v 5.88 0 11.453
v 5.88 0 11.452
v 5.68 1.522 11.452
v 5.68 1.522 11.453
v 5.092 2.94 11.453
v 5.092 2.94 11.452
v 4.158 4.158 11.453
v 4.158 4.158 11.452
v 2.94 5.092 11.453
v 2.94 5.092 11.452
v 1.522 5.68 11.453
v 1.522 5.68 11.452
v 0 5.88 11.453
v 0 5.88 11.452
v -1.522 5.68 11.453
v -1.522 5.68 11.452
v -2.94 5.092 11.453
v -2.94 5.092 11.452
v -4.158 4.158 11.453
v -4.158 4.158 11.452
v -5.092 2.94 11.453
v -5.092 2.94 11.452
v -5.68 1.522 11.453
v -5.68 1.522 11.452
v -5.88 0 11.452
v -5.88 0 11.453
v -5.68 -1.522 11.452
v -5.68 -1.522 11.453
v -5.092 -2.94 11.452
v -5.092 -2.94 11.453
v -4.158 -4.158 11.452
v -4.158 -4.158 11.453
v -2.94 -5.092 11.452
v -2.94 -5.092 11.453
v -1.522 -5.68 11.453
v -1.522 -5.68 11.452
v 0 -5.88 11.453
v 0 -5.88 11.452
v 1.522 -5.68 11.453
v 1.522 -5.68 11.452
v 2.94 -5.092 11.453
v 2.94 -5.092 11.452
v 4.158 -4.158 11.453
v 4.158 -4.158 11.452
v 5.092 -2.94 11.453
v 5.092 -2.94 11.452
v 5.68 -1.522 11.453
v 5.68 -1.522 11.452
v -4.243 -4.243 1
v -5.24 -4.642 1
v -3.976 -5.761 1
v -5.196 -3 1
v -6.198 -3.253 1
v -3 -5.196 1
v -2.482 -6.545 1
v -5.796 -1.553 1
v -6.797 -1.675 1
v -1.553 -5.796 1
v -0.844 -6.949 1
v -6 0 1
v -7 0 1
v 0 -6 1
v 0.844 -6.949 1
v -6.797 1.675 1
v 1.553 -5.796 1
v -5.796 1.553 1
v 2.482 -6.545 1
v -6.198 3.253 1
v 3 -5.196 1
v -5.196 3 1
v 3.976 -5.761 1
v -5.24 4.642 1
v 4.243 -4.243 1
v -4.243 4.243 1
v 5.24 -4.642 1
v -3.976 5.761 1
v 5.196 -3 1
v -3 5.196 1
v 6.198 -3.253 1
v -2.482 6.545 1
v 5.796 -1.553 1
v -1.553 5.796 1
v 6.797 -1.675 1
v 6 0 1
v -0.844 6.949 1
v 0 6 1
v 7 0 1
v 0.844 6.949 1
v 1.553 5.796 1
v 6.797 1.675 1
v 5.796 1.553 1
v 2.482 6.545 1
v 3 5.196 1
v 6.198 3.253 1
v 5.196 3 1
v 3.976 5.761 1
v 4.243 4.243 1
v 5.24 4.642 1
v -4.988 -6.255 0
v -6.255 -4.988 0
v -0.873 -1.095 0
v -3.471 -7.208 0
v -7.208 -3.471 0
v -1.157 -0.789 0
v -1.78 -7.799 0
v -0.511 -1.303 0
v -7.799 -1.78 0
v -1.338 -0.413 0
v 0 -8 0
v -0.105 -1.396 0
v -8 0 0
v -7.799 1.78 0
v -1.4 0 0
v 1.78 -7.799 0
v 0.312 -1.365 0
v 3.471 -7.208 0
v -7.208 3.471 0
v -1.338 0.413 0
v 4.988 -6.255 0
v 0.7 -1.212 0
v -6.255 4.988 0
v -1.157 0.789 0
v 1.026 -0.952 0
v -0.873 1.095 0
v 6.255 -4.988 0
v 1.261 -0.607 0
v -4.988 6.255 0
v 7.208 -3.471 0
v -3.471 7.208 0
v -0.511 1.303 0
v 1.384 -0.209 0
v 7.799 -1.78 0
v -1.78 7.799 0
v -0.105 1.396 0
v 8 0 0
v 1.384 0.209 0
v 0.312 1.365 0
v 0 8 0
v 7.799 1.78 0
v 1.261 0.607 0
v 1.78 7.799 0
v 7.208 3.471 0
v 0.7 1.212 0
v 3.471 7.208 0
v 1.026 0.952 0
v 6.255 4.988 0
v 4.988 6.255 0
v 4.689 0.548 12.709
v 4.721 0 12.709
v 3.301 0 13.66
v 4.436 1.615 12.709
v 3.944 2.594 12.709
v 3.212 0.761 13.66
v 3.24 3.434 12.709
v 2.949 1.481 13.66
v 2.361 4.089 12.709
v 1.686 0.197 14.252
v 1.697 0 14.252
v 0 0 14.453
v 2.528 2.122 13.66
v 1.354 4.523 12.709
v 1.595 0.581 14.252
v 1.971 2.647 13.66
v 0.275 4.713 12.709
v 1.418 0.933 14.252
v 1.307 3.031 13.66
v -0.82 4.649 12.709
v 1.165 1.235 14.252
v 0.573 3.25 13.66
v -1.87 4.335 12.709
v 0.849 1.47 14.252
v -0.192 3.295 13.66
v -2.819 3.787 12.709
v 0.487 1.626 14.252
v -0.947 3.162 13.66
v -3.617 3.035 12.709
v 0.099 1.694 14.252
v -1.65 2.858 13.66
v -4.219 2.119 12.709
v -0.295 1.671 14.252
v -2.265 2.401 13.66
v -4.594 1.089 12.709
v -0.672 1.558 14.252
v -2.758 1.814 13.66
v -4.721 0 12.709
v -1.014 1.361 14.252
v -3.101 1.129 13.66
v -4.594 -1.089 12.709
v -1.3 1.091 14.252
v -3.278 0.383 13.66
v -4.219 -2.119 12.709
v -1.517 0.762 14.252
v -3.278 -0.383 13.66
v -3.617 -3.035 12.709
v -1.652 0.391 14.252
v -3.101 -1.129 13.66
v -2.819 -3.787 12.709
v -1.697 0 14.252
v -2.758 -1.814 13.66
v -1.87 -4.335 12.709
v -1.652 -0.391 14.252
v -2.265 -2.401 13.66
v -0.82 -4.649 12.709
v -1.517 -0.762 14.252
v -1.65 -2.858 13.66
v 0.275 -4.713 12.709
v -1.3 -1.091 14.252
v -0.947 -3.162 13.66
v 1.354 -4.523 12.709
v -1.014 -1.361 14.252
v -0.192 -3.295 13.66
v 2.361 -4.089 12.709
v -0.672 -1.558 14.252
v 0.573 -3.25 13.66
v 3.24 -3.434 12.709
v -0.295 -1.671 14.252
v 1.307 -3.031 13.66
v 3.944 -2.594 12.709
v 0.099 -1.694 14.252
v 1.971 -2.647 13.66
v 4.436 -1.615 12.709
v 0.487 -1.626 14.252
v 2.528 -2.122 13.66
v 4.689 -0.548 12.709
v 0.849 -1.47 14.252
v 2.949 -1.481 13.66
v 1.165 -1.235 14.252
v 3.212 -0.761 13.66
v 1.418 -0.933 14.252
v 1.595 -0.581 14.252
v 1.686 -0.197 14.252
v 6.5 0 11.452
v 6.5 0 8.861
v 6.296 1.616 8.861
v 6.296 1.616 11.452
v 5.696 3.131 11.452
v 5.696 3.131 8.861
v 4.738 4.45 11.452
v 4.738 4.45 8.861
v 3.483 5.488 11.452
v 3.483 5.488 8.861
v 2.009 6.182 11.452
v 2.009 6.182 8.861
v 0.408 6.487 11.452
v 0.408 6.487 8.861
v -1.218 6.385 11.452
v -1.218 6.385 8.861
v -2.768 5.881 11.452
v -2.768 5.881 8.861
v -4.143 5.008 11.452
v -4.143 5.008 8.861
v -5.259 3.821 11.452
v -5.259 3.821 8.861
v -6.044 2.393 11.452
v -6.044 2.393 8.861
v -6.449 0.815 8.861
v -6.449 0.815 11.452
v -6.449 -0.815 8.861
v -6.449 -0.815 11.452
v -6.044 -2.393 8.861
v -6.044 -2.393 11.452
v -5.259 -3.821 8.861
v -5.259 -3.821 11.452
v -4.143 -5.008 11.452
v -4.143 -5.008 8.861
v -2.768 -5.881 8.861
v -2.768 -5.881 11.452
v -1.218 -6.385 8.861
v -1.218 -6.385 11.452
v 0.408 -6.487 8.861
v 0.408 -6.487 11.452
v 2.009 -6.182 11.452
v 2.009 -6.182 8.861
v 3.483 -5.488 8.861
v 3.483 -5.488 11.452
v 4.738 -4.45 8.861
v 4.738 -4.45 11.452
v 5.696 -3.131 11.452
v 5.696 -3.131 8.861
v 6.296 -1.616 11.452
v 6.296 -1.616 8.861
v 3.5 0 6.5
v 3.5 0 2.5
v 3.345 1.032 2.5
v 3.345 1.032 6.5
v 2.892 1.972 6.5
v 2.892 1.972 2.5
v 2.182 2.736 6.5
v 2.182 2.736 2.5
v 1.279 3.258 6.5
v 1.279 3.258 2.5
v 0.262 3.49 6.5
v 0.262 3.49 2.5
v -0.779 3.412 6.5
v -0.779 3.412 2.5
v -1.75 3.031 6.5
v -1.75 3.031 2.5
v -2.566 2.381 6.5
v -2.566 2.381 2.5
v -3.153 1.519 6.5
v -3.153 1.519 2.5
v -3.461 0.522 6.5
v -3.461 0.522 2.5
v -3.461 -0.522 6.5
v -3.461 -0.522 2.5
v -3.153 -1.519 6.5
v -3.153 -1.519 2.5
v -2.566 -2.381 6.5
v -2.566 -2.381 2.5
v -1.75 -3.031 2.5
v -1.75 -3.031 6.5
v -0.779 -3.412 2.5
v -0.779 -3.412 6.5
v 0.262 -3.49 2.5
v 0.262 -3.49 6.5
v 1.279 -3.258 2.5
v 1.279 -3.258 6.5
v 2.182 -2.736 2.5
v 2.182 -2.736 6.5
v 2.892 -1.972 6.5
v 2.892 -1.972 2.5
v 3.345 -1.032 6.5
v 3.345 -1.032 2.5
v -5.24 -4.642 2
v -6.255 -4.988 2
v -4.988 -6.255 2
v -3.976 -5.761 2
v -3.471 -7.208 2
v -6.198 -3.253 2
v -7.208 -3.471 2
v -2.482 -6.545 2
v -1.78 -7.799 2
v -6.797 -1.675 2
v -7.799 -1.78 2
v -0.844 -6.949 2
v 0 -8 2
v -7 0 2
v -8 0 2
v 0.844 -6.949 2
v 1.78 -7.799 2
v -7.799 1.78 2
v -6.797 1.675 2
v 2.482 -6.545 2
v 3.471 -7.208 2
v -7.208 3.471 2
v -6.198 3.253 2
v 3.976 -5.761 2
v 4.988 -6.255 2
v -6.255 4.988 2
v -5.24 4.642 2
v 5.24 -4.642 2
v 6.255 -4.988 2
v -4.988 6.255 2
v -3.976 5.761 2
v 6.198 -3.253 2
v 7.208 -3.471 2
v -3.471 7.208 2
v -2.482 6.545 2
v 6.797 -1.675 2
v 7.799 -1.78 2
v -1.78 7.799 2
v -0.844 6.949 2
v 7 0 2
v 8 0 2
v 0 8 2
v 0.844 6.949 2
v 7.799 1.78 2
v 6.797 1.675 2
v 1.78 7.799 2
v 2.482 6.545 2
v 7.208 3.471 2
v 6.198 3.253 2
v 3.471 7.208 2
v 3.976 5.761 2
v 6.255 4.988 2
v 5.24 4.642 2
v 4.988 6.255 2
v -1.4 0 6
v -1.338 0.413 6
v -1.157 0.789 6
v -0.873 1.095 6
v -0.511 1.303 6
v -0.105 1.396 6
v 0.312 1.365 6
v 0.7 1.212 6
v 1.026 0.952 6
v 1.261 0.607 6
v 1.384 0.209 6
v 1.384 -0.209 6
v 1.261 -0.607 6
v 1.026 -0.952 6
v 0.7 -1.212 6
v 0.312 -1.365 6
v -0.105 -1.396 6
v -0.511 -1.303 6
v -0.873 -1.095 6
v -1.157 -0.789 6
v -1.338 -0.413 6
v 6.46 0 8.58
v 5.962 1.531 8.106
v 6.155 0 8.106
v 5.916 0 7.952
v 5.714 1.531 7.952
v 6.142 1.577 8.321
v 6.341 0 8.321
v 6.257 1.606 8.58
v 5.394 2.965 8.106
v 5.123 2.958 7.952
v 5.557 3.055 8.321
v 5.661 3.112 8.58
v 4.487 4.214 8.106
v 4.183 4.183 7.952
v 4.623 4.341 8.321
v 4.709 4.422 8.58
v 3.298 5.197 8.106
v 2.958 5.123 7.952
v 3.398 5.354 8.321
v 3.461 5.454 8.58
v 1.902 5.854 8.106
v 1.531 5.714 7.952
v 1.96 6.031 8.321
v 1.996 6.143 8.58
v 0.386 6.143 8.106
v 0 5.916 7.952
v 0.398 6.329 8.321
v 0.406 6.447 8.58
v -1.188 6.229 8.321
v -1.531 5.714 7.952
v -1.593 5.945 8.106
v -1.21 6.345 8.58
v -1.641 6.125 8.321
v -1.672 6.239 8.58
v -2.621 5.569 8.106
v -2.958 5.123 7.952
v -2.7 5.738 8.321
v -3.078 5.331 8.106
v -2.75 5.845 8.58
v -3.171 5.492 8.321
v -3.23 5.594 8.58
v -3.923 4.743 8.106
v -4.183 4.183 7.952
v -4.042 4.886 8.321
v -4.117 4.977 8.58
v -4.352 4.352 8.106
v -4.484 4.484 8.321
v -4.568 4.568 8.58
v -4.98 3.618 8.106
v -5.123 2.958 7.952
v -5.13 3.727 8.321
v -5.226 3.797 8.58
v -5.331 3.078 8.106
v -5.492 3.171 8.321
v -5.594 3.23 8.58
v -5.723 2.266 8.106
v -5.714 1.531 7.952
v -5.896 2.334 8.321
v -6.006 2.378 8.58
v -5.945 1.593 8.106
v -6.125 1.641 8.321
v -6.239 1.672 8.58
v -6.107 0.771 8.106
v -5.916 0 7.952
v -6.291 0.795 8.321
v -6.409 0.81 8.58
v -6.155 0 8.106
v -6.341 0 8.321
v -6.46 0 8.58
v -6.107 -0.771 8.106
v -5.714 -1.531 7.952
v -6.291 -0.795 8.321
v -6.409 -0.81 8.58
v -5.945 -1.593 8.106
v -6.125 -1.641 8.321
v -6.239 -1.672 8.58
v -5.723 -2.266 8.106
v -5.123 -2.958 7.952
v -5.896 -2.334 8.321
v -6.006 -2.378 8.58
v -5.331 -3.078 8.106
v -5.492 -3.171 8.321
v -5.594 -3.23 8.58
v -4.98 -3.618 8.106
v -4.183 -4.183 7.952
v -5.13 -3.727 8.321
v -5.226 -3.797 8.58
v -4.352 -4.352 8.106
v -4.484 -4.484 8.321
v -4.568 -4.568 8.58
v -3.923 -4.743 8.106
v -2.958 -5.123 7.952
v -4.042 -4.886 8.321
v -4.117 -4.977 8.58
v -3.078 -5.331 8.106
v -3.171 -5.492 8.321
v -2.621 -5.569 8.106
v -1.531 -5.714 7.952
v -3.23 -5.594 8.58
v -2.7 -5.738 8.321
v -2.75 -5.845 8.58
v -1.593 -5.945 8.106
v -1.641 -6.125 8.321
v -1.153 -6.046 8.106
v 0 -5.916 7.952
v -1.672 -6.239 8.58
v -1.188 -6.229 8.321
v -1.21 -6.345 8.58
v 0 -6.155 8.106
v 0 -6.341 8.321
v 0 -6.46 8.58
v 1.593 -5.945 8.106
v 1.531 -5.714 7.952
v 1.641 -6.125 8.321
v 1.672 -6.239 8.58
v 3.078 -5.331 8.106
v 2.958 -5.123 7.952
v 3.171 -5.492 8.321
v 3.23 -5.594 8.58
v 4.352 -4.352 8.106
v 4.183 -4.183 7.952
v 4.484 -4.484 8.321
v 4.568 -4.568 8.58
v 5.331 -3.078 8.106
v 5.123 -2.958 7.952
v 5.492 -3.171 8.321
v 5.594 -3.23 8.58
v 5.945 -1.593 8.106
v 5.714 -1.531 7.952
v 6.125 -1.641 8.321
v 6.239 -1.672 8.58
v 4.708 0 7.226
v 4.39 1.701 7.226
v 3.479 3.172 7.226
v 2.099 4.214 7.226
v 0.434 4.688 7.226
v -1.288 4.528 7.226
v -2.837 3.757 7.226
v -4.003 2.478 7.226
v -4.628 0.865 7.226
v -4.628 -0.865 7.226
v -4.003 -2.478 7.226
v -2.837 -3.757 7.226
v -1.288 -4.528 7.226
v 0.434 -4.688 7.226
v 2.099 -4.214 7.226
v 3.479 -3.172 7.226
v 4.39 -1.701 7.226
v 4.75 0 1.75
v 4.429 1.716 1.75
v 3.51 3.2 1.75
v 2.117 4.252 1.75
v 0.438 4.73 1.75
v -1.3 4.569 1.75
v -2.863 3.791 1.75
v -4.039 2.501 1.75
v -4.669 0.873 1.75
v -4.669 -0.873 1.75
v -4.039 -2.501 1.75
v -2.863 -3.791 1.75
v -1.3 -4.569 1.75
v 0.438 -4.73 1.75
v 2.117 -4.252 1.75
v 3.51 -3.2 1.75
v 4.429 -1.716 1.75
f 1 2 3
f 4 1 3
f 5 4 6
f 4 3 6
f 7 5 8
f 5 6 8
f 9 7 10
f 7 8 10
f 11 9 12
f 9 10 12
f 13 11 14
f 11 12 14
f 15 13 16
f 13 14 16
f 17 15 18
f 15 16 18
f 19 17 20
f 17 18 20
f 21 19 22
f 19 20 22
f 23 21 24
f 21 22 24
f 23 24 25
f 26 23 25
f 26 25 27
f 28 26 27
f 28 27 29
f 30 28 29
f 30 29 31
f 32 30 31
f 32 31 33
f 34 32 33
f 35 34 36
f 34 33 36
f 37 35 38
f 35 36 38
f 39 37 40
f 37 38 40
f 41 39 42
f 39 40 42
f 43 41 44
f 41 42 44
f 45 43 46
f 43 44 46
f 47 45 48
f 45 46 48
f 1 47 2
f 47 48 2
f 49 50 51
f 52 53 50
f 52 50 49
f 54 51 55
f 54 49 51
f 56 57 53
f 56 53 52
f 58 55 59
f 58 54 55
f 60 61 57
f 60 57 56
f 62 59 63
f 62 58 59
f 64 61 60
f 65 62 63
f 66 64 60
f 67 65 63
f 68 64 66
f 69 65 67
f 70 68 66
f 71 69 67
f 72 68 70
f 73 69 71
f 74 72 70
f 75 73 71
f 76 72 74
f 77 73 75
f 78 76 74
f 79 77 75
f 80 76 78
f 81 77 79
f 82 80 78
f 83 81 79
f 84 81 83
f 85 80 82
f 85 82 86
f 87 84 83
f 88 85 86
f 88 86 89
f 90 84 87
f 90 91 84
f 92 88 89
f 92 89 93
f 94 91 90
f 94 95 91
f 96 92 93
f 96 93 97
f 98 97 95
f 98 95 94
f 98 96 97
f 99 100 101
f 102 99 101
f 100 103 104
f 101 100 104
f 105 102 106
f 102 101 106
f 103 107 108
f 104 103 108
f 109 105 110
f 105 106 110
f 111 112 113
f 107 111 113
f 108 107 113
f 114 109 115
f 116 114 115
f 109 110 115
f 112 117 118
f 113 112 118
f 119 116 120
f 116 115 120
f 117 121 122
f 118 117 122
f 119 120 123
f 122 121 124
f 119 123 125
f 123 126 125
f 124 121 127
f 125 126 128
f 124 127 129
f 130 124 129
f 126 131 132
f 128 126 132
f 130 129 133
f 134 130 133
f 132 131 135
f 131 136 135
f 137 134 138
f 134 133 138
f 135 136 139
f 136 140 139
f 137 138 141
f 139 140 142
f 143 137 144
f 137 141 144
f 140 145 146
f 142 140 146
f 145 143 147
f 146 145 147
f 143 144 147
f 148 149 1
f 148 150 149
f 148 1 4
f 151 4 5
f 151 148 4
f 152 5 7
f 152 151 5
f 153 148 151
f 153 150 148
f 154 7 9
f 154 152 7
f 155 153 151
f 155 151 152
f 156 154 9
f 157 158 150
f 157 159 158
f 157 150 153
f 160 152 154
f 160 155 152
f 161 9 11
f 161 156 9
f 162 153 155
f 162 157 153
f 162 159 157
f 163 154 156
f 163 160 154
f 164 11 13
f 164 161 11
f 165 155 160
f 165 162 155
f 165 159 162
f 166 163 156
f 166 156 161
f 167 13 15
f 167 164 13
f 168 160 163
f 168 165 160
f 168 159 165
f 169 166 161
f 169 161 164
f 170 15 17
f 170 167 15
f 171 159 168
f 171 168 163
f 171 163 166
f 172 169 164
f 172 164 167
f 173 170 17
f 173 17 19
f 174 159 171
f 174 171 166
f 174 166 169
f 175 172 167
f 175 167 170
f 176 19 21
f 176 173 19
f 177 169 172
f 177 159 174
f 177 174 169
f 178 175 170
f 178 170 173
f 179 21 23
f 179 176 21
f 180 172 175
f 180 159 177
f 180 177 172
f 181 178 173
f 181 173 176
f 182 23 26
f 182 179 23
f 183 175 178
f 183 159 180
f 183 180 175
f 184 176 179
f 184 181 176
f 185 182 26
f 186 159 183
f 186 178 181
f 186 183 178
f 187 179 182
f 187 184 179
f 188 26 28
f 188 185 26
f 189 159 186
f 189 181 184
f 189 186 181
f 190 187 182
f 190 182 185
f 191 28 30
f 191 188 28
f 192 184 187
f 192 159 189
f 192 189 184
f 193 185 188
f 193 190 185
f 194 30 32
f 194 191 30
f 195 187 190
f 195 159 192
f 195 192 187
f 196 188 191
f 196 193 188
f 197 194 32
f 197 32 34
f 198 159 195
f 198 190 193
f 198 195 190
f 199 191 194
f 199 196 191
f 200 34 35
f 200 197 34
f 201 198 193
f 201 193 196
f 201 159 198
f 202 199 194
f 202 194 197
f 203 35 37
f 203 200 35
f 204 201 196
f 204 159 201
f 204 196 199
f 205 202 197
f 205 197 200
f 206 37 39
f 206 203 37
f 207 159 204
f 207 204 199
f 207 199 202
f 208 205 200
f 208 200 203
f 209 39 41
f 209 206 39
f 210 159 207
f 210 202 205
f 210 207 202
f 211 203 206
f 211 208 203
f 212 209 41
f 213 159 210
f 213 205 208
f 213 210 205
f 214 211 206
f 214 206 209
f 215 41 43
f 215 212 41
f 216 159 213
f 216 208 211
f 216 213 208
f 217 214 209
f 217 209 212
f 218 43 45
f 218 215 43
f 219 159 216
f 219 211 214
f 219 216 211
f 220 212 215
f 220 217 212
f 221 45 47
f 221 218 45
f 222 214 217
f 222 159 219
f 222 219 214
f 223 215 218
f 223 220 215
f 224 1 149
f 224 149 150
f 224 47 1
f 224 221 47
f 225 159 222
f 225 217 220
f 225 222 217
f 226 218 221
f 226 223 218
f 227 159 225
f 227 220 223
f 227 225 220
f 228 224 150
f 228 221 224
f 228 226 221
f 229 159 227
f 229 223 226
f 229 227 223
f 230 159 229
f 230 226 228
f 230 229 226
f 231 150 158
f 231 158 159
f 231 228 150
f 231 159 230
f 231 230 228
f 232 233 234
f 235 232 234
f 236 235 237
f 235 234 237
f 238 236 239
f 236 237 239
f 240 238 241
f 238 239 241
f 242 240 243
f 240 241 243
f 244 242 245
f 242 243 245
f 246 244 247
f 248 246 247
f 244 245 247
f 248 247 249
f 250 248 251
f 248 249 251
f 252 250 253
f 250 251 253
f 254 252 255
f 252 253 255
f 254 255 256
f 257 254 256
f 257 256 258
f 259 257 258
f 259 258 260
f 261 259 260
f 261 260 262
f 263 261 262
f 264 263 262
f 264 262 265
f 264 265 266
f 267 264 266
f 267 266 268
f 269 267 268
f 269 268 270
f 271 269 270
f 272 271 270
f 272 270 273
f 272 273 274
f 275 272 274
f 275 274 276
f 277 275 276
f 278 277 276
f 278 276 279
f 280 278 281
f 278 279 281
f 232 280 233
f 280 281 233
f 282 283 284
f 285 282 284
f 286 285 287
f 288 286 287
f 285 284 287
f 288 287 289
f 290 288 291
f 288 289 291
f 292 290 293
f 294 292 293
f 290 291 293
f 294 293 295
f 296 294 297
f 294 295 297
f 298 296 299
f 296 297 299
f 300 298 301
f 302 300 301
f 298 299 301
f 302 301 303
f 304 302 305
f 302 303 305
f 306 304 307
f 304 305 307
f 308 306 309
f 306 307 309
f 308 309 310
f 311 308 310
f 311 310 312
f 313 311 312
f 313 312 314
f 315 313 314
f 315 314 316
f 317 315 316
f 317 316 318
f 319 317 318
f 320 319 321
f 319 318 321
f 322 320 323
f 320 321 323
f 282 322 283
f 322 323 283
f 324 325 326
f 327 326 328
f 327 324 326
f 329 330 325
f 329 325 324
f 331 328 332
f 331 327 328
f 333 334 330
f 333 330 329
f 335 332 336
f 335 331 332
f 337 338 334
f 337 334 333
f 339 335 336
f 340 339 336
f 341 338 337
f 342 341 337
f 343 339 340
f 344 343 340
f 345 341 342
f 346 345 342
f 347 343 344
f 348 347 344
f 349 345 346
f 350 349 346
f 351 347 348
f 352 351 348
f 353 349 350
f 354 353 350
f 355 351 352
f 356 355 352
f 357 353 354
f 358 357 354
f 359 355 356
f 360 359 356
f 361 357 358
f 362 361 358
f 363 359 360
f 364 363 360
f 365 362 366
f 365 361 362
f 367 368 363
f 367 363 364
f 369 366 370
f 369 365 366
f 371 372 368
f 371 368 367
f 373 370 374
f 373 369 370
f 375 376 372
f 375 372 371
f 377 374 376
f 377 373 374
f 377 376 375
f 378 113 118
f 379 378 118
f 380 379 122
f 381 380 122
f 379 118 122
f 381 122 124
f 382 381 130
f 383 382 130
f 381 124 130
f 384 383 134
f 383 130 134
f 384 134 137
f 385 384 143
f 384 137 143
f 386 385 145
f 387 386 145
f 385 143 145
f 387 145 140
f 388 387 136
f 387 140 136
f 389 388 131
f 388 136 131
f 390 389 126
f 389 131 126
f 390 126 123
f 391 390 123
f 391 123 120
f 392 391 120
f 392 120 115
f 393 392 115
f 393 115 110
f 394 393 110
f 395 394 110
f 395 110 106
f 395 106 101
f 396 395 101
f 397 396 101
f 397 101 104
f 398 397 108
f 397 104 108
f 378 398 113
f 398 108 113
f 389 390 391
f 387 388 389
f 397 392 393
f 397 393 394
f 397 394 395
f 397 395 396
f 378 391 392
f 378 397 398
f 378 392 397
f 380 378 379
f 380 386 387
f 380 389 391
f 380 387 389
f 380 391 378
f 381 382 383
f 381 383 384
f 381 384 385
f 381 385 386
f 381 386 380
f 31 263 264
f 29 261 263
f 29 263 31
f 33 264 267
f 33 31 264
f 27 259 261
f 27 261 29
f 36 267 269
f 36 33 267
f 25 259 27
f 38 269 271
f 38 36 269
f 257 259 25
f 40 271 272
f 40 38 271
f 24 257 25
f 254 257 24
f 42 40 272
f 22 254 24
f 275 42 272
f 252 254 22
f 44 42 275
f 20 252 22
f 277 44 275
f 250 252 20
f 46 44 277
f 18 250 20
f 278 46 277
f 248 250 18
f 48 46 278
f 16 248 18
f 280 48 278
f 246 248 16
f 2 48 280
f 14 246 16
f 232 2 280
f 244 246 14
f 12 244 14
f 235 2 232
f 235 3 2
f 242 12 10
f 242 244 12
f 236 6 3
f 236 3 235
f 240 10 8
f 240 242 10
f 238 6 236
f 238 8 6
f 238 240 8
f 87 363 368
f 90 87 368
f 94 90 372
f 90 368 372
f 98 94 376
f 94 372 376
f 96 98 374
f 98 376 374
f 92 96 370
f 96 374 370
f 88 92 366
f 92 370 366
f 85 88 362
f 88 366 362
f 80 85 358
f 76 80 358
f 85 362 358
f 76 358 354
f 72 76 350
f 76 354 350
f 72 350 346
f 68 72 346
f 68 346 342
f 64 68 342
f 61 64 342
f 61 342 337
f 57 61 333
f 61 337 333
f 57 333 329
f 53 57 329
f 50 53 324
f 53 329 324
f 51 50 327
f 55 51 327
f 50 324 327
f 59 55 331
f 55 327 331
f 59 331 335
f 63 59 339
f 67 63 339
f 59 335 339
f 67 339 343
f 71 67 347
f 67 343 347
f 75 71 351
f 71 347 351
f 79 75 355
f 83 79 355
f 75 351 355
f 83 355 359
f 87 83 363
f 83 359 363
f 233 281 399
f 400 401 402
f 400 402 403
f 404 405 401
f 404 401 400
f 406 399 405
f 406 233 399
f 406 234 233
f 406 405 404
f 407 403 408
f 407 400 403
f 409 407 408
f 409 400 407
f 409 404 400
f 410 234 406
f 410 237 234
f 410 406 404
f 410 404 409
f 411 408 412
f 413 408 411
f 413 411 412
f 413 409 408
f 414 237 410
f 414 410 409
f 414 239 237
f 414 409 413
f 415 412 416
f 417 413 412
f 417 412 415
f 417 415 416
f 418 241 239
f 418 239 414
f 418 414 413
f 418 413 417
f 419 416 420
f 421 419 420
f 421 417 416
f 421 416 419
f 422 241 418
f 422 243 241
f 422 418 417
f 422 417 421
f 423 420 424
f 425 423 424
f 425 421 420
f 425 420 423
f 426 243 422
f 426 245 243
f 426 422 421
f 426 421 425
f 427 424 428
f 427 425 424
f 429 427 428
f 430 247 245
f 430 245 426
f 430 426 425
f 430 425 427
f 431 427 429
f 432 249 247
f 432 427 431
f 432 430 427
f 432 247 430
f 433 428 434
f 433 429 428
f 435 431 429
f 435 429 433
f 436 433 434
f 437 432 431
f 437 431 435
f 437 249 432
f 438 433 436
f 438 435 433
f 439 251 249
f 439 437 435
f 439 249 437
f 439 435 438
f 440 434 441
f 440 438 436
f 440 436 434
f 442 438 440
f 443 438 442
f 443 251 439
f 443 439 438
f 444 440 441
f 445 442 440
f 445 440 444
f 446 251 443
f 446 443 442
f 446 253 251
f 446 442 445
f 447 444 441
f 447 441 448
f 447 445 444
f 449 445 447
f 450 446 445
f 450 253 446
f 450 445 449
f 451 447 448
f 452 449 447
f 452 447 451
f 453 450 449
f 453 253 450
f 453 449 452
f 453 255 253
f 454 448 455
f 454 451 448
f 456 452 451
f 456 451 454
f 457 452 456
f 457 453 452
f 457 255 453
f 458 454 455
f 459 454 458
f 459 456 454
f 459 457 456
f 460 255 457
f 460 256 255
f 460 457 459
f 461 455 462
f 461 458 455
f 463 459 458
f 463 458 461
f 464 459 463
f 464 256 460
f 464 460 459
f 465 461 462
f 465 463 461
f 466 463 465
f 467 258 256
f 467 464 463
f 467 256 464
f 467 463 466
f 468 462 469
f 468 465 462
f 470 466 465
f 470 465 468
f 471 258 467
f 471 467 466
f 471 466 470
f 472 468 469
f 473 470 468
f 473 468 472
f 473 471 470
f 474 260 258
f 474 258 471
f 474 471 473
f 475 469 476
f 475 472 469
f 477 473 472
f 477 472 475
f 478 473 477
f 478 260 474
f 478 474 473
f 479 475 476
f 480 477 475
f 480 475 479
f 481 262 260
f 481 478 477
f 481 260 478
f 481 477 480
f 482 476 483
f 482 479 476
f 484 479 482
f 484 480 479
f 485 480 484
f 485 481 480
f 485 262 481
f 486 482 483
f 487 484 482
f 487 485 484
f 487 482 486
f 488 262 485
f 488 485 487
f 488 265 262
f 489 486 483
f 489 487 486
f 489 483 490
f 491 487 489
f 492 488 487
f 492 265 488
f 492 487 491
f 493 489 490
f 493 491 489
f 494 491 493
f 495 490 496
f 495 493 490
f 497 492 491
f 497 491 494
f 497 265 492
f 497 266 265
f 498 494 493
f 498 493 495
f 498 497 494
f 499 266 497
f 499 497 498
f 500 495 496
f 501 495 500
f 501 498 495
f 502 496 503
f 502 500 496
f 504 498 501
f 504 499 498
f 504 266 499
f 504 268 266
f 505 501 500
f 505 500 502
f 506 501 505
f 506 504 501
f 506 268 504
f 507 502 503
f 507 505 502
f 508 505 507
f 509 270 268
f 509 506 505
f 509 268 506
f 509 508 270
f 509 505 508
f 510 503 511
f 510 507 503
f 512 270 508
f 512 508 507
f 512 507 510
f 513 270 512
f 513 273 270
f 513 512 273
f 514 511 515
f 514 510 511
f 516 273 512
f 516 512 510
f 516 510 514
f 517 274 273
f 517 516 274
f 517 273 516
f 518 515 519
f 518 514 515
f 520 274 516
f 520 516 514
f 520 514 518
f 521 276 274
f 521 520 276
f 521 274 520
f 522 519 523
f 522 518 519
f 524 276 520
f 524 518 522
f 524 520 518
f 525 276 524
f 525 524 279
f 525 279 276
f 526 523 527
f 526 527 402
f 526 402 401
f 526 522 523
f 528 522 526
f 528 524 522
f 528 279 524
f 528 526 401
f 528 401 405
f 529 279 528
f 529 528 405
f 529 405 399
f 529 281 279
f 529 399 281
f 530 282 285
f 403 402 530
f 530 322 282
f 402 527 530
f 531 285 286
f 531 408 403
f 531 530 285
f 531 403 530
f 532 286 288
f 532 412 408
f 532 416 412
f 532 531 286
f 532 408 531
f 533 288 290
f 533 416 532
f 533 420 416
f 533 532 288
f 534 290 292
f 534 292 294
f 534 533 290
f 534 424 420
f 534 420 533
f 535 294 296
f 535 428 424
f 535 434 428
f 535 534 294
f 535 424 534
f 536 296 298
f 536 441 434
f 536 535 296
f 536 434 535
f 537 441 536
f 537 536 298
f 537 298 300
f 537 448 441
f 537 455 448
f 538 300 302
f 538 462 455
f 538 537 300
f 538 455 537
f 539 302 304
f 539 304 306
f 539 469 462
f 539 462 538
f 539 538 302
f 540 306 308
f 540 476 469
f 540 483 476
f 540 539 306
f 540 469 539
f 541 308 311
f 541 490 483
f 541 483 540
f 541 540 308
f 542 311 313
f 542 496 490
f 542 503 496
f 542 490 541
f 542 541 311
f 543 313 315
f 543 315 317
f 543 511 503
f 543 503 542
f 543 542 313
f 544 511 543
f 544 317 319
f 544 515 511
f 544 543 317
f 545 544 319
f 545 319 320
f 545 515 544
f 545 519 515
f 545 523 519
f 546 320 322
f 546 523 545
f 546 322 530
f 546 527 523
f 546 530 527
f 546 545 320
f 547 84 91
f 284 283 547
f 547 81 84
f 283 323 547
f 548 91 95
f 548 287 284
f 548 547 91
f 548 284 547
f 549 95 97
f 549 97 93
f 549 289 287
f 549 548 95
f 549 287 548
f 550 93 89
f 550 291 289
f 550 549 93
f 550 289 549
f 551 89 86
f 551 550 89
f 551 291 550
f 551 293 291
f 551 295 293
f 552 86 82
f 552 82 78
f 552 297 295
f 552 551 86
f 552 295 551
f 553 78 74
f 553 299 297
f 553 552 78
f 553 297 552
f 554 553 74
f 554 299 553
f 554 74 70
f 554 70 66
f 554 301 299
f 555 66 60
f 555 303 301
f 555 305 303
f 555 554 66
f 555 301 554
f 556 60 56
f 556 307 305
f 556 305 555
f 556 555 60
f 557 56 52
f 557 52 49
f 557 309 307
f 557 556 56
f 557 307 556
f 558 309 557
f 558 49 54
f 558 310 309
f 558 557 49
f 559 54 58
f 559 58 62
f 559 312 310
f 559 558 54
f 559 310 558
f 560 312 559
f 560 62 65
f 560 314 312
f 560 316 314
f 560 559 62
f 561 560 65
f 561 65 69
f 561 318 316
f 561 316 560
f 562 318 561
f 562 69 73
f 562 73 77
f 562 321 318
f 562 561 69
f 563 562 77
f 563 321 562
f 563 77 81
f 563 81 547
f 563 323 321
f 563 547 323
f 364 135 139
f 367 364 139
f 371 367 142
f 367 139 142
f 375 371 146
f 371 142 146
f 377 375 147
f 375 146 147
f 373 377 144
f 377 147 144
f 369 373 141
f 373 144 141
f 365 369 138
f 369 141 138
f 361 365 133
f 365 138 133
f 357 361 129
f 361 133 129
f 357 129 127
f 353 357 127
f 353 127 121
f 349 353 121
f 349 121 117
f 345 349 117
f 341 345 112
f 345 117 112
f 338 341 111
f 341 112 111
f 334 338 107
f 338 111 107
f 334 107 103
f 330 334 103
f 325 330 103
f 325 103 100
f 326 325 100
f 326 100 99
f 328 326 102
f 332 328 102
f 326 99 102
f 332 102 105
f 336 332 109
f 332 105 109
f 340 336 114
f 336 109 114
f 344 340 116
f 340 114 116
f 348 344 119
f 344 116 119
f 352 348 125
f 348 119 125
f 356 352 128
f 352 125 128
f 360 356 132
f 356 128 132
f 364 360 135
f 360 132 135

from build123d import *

# Parameters (mm, degrees)
CROQUIS2_R              = 8
SALIENTE_EXTRUIR1_DEPTH = 2
CROQUIS3_R              = 7
CORTAR_EXTRUIR1_DEPTH   = 1
CROQUIS4_R              = 6
CROQUIS5_R              = 3.5
CROQUIS6_R              = 3.5
SALIENTE_EXTRUIR2_DEPTH = 4
CROQUIS9_R              = 3.5
CROQUIS10_R             = 5.916
CROQUIS11_R             = 6.5
SALIENTE_EXTRUIR3_DEPTH = 3.5
REDONDEO2_R             = 1
CROQUIS15_R             = 5.88
SALIENTE_EXTRUIR4_DEPTH = 0.001
C_PULA1_FACE_RADIUS     = 5.88
C_PULA1_HEIGHT          = 3
CROQUIS16_R             = 1.4
CORTAR_EXTRUIR2_DEPTH   = 6


with BuildPart() as part:
    # Croquis2 → Saliente-Extruir1 (new body)
    with BuildSketch(Plane.XY):
        Circle(CROQUIS2_R)
    extrude(amount=SALIENTE_EXTRUIR1_DEPTH)

    # Croquis3 → Cortar-Extruir1 (cut)
    with BuildSketch(Plane.XY.offset(2)):
        Circle(CROQUIS3_R)
    extrude(amount=-CORTAR_EXTRUIR1_DEPTH, mode=Mode.SUBTRACT)

    # Croquis4 → Recubrir1 section 0
    with BuildSketch(Plane.XY.offset(1)):
        Circle(CROQUIS4_R)
    # Croquis5 → Recubrir1 section 1
    with BuildSketch(Plane.XY.offset(2.5)):
        Circle(CROQUIS5_R)
    loft()

    # Croquis6 → Saliente-Extruir2 (add)
    with BuildSketch(Plane.XY.offset(2.5)):
        Circle(CROQUIS6_R)
    extrude(amount=SALIENTE_EXTRUIR2_DEPTH)

    # Croquis9 → Recubrir3 section 0
    with BuildSketch(Plane.XY.offset(6.5)):
        Circle(CROQUIS9_R)
    # Croquis10 → Recubrir3 section 1
    with BuildSketch(Plane.XY.offset(7.952)):
        Circle(CROQUIS10_R)
    loft()

    # Croquis11 → Saliente-Extruir3 (add)
    with BuildSketch(Plane.XY.offset(7.952)):
        Circle(CROQUIS11_R)
    extrude(amount=SALIENTE_EXTRUIR3_DEPTH)

    # Redondeo2
    # the kernel refuses this fillet: 1 mm, written as the material it takes off along each edge
    with BuildSketch(Plane(origin=(0, 0, 7.952), x_dir=(1, 0, 0), z_dir=(0, -1, 0))) as redondeo2_piece_1:
        with BuildLine():
            CenterArc((5.5, 0.909364613), REDONDEO2_R, 294.582307044, 65.417692956)
            Line((5.916, 0), (5.92432, -0.018187292))
            ThreePointArc((5.92432, -0.018187292), (6.208, -0.02), (6.5, -0.02))
            Line((6.5, -0.02), (6.52, 0))
            Line((6.52, 0), (6.52, 0.909364613))
            Line((6.52, 0.909364613), (6.5, 0.909364613))
        make_face()
    revolve(axis=Axis((0, 0, 7.952), (0, 0, 1)), mode=Mode.SUBTRACT)

    # Croquis15 → Saliente-Extruir4 (add)
    with BuildSketch(Plane.XY.offset(11.452)):
        Circle(CROQUIS15_R)
    extrude(amount=SALIENTE_EXTRUIR4_DEPTH)

    # Cúpula1: a dome of height H over a round flat face of radius A is a cap of a sphere of radius (A * A + H * H) / (2 * H)
    c_pula1_r = (C_PULA1_FACE_RADIUS * C_PULA1_FACE_RADIUS + C_PULA1_HEIGHT * C_PULA1_HEIGHT) / (2 * C_PULA1_HEIGHT)
    c_pula1_base = Plane((0, 0, 11.453), z_dir=(0, 0, 1))
    with Locations(c_pula1_base.offset(C_PULA1_HEIGHT - c_pula1_r)):
        c_pula1_ball = Sphere(c_pula1_r, mode=Mode.PRIVATE)
    add(split(c_pula1_ball, bisect_by=c_pula1_base, keep=Keep.TOP, mode=Mode.PRIVATE))

    # Croquis16 → Cortar-Extruir2 (cut)
    with BuildSketch(Plane(origin=(0, 0, 0), x_dir=(-1, 0, 0), z_dir=(0, 0, -1))):
        Circle(CROQUIS16_R)
    extrude(amount=-CORTAR_EXTRUIR2_DEPTH, mode=Mode.SUBTRACT)


solid = part.part
